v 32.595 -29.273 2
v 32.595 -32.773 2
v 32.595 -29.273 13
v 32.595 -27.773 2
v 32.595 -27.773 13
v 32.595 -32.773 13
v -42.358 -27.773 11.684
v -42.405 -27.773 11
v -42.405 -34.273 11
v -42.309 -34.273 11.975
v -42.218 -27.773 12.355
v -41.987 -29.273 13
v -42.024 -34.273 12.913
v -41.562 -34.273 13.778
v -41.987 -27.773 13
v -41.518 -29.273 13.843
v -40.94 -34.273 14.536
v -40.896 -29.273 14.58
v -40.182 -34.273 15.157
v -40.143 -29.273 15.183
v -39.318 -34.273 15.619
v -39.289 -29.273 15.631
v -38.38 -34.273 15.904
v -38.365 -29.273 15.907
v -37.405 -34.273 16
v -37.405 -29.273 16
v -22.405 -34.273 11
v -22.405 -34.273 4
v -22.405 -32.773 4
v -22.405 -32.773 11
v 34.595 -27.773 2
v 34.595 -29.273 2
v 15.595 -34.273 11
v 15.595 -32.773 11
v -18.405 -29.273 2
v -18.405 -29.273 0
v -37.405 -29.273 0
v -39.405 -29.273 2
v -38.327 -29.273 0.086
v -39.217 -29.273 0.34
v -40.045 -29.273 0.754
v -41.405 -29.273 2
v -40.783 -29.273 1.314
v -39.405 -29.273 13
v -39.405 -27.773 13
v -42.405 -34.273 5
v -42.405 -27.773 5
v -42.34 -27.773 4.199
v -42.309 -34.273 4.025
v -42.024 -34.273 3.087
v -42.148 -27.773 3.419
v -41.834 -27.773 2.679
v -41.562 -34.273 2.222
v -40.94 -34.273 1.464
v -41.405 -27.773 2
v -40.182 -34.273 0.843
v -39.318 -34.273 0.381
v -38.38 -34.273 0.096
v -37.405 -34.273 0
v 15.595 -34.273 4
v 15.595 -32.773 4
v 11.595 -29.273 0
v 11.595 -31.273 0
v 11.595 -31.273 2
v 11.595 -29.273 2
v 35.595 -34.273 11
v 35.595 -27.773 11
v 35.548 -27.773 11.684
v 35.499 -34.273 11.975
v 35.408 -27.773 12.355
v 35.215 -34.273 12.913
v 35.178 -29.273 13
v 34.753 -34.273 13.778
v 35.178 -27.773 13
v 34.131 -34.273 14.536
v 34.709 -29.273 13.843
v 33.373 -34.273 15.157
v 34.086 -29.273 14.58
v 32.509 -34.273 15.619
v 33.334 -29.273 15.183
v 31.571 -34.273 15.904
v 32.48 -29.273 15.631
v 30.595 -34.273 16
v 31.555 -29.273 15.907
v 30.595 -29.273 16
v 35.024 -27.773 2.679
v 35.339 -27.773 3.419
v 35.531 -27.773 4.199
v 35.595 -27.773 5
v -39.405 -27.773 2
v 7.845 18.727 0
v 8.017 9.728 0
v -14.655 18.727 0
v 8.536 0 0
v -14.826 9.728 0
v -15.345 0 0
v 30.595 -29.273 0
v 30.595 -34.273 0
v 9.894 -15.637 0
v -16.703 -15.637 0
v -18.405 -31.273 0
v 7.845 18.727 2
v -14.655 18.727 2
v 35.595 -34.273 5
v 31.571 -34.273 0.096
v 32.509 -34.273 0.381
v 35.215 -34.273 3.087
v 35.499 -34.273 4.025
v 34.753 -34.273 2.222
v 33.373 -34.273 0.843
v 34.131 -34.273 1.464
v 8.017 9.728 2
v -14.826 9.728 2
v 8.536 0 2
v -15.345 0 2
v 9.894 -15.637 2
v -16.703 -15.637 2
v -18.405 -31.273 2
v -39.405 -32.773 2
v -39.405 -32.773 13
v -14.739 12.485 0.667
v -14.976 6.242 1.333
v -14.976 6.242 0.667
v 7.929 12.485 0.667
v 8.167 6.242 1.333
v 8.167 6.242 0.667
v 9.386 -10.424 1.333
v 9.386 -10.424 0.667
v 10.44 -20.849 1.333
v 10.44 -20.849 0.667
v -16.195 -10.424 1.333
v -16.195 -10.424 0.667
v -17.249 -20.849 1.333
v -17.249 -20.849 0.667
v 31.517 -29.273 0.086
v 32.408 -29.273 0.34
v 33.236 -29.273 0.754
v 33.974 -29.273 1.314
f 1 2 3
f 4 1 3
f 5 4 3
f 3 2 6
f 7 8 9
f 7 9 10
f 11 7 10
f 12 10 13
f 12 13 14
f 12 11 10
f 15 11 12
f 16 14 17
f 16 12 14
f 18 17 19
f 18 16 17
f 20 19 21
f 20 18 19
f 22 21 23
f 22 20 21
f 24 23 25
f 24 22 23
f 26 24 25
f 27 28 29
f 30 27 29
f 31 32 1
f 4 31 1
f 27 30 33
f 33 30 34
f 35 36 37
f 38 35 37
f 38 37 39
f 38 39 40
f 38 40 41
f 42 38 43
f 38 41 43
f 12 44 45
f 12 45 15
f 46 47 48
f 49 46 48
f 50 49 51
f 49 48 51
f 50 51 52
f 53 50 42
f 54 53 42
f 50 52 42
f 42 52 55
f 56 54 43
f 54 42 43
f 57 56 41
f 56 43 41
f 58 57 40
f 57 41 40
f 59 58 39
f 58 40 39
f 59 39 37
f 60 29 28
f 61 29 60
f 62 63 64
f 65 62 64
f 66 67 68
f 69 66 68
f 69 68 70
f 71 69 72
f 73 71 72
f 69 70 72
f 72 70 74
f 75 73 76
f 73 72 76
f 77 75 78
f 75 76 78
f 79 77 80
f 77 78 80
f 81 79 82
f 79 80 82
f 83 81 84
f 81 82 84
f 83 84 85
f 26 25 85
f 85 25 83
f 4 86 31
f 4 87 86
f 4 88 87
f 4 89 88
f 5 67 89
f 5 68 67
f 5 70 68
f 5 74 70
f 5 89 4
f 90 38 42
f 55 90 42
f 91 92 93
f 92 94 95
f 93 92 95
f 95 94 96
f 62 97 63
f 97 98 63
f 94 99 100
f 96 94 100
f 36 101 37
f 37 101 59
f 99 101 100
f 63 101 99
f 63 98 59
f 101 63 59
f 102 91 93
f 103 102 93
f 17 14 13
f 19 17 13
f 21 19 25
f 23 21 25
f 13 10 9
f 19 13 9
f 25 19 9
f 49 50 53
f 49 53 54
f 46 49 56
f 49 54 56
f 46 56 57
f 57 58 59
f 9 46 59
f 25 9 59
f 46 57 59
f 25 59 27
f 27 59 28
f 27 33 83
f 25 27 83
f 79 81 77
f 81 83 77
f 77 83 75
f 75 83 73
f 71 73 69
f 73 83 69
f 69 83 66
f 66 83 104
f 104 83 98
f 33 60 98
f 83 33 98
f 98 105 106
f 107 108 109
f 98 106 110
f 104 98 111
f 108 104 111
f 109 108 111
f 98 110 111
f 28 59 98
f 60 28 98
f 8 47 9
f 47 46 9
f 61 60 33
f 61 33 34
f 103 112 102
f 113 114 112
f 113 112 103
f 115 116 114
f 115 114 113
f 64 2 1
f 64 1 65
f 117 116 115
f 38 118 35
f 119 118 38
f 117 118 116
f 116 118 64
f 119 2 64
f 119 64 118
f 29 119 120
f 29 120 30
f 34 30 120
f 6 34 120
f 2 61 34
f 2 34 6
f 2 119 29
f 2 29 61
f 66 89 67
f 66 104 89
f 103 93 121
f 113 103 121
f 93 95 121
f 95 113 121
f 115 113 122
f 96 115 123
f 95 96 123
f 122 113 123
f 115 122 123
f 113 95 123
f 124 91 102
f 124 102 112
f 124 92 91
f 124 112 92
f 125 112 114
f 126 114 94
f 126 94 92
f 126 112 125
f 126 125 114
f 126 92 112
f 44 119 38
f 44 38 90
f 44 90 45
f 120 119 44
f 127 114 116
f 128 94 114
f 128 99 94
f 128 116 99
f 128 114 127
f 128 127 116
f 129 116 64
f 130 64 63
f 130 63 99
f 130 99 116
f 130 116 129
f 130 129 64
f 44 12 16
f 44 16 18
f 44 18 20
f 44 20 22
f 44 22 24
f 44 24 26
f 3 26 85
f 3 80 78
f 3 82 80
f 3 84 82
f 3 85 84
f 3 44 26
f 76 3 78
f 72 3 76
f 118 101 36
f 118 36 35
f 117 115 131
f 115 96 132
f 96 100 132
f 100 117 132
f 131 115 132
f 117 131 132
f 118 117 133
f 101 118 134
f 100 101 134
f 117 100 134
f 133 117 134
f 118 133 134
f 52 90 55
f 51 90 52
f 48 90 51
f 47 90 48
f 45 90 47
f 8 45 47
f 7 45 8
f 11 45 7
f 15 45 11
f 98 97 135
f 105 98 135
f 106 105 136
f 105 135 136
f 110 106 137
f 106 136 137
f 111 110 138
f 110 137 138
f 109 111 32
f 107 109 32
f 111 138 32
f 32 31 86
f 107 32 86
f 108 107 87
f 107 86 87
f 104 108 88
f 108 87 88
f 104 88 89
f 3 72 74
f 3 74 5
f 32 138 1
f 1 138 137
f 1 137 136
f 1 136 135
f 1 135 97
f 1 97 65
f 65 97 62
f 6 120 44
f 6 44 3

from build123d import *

# Parameters (mm, degrees)
F1_DEPTH  = 2
F2_W      = 78
F2_H      = 1.5
F3_DEPTH  = 2
F4_W      = 20
F4_H      = 1.5
F5_DEPTH  = 7
F6_W      = 78
F6_H      = 1.5
F7_DEPTH  = 2
F8_W      = 78
F8_H      = 3
F9_DEPTH  = 3
F10_DEPTH = 2
F11_DEPTH = 2
F12_W     = 3
F12_H     = 11
F13_DEPTH = 5
F14_R     = 5


with BuildPart() as f1:
    # F0 (on Top) → F1 (new body)
    with BuildSketch(Plane.XY):
        with BuildLine():
            Line((7.8453938663, 18.7269745824), (-14.6546061337, 18.7269745824))
            add(Edge.make_bspline(
                [(-14.6546061337, 18.7269745824), (-14.6546061337, 12.4846497216), (-14.9176308165, 6.2423248608), (-15.345167051, 0)],
                knots=[0.5, 0.5, 0.5, 0.5, 0.6872697458, 0.6872697458, 0.6872697458, 0.6872697458], degree=3))
            Line((-15.345167051, 0), (8.5359547836, 0))
            add(Edge.make_bspline(
                [(7.8453938663, 18.7269745824), (7.8453938663, 12.4846497216), (8.1084185491, 6.2423248608), (8.5359547836, 0)],
                knots=[0.5, 0.5, 0.5, 0.5, 0.6872697458, 0.6872697458, 0.6872697458, 0.6872697458], degree=3))
        make_face()
        Polygon((11.5953938663, -31.2730254176), (-18.4046061337, -31.2730254176), (-42.4046061337, -31.2730254176), (-42.4046061337, -34.2730254176), (35.5953938663, -34.2730254176), (35.5953938663, -31.2730254176), align=None)
        with BuildLine():
            Line((8.5359547836, 0), (-15.345167051, 0))
            add(Edge.make_bspline(
                [(-15.345167051, 0), (-16.0591292274, -10.4243418059), (-17.2318676805, -20.8486836117), (-18.4046061337, -31.2730254176)],
                knots=[0.6872697458, 0.6872697458, 0.6872697458, 0.6872697458, 1, 1, 1, 1], degree=3))
            Line((-18.4046061337, -31.2730254176), (11.5953938663, -31.2730254176))
            add(Edge.make_bspline(
                [(8.5359547836, 0), (9.24991696, -10.4243418059), (10.4226554131, -20.8486836117), (11.5953938663, -31.2730254176)],
                knots=[0.6872697458, 0.6872697458, 0.6872697458, 0.6872697458, 1, 1, 1, 1], degree=3))
        make_face()
    extrude(amount=F1_DEPTH)

    # F2 (on face) → F3 (join)
    with BuildSketch(Plane.XY.offset(2)):
        with Locations((-3.4046061337, -33.5230254176)):
            Rectangle(F2_W, F2_H)
    extrude(amount=F3_DEPTH)

    # F4 (on face) → F5 (join)
    with BuildSketch(Plane.XY.offset(4)):
        with Locations((-32.4046061337, -33.5230254176)):
            Rectangle(F4_W, F4_H)
        with Locations((25.5953938663, -33.5230254176)):
            Rectangle(F4_W, F4_H)
    extrude(amount=F5_DEPTH)

    # F6 (on face) → F7 (join)
    with BuildSketch(Plane.XY.offset(11)):
        with Locations((-3.4046061337, -33.5230254176)):
            Rectangle(F6_W, F6_H)
    extrude(amount=F7_DEPTH)

    # F8 (on face) → F9 (join)
    with BuildSketch(Plane.XY.offset(13)):
        with Locations((-3.4046061337, -32.7730254176)):
            Rectangle(F8_W, F8_H)
    extrude(amount=F9_DEPTH)

    # F10 (add): a face of the model
    f10_faces = [f1.faces().sort_by_distance(p)[0] for p in [
        (-3.4046061337, -31.2730254176, 14.5),
    ]]
    extrude(f10_faces, amount=F10_DEPTH)

    # F11 (add): faces of the model
    f11_faces = [f1.faces().sort_by_distance(p)[0] for p in [
        (23.5953938663, -31.2730254176, 1),
        (-30.4046061337, -31.2730254176, 1),
    ]]
    extrude(f11_faces, amount=F11_DEPTH)

    # F12 (on face) → F13 (join)
    with BuildSketch(Plane(origin=(0, -32.7730254176, 0), x_dir=(-1, 0, 0), z_dir=(0, 1, 0))):
        with Locations((40.9046061337, 7.5)):
            Rectangle(F12_W, F12_H)
        with Locations((-34.0953938663, 7.5)):
            Rectangle(F12_W, F12_H)
    extrude(amount=F13_DEPTH)

    # F14
    f14_edges = [f1.edges().sort_by_distance(p)[0] for p in [
        (35.595394, -31.773025, 16),
        (35.595394, -31.773025, 0),
        (-42.404606, -31.773025, 0),
        (-42.404606, -31.773025, 16),
    ]]
    fillet(f14_edges, radius=F14_R)


solid = f1.part
